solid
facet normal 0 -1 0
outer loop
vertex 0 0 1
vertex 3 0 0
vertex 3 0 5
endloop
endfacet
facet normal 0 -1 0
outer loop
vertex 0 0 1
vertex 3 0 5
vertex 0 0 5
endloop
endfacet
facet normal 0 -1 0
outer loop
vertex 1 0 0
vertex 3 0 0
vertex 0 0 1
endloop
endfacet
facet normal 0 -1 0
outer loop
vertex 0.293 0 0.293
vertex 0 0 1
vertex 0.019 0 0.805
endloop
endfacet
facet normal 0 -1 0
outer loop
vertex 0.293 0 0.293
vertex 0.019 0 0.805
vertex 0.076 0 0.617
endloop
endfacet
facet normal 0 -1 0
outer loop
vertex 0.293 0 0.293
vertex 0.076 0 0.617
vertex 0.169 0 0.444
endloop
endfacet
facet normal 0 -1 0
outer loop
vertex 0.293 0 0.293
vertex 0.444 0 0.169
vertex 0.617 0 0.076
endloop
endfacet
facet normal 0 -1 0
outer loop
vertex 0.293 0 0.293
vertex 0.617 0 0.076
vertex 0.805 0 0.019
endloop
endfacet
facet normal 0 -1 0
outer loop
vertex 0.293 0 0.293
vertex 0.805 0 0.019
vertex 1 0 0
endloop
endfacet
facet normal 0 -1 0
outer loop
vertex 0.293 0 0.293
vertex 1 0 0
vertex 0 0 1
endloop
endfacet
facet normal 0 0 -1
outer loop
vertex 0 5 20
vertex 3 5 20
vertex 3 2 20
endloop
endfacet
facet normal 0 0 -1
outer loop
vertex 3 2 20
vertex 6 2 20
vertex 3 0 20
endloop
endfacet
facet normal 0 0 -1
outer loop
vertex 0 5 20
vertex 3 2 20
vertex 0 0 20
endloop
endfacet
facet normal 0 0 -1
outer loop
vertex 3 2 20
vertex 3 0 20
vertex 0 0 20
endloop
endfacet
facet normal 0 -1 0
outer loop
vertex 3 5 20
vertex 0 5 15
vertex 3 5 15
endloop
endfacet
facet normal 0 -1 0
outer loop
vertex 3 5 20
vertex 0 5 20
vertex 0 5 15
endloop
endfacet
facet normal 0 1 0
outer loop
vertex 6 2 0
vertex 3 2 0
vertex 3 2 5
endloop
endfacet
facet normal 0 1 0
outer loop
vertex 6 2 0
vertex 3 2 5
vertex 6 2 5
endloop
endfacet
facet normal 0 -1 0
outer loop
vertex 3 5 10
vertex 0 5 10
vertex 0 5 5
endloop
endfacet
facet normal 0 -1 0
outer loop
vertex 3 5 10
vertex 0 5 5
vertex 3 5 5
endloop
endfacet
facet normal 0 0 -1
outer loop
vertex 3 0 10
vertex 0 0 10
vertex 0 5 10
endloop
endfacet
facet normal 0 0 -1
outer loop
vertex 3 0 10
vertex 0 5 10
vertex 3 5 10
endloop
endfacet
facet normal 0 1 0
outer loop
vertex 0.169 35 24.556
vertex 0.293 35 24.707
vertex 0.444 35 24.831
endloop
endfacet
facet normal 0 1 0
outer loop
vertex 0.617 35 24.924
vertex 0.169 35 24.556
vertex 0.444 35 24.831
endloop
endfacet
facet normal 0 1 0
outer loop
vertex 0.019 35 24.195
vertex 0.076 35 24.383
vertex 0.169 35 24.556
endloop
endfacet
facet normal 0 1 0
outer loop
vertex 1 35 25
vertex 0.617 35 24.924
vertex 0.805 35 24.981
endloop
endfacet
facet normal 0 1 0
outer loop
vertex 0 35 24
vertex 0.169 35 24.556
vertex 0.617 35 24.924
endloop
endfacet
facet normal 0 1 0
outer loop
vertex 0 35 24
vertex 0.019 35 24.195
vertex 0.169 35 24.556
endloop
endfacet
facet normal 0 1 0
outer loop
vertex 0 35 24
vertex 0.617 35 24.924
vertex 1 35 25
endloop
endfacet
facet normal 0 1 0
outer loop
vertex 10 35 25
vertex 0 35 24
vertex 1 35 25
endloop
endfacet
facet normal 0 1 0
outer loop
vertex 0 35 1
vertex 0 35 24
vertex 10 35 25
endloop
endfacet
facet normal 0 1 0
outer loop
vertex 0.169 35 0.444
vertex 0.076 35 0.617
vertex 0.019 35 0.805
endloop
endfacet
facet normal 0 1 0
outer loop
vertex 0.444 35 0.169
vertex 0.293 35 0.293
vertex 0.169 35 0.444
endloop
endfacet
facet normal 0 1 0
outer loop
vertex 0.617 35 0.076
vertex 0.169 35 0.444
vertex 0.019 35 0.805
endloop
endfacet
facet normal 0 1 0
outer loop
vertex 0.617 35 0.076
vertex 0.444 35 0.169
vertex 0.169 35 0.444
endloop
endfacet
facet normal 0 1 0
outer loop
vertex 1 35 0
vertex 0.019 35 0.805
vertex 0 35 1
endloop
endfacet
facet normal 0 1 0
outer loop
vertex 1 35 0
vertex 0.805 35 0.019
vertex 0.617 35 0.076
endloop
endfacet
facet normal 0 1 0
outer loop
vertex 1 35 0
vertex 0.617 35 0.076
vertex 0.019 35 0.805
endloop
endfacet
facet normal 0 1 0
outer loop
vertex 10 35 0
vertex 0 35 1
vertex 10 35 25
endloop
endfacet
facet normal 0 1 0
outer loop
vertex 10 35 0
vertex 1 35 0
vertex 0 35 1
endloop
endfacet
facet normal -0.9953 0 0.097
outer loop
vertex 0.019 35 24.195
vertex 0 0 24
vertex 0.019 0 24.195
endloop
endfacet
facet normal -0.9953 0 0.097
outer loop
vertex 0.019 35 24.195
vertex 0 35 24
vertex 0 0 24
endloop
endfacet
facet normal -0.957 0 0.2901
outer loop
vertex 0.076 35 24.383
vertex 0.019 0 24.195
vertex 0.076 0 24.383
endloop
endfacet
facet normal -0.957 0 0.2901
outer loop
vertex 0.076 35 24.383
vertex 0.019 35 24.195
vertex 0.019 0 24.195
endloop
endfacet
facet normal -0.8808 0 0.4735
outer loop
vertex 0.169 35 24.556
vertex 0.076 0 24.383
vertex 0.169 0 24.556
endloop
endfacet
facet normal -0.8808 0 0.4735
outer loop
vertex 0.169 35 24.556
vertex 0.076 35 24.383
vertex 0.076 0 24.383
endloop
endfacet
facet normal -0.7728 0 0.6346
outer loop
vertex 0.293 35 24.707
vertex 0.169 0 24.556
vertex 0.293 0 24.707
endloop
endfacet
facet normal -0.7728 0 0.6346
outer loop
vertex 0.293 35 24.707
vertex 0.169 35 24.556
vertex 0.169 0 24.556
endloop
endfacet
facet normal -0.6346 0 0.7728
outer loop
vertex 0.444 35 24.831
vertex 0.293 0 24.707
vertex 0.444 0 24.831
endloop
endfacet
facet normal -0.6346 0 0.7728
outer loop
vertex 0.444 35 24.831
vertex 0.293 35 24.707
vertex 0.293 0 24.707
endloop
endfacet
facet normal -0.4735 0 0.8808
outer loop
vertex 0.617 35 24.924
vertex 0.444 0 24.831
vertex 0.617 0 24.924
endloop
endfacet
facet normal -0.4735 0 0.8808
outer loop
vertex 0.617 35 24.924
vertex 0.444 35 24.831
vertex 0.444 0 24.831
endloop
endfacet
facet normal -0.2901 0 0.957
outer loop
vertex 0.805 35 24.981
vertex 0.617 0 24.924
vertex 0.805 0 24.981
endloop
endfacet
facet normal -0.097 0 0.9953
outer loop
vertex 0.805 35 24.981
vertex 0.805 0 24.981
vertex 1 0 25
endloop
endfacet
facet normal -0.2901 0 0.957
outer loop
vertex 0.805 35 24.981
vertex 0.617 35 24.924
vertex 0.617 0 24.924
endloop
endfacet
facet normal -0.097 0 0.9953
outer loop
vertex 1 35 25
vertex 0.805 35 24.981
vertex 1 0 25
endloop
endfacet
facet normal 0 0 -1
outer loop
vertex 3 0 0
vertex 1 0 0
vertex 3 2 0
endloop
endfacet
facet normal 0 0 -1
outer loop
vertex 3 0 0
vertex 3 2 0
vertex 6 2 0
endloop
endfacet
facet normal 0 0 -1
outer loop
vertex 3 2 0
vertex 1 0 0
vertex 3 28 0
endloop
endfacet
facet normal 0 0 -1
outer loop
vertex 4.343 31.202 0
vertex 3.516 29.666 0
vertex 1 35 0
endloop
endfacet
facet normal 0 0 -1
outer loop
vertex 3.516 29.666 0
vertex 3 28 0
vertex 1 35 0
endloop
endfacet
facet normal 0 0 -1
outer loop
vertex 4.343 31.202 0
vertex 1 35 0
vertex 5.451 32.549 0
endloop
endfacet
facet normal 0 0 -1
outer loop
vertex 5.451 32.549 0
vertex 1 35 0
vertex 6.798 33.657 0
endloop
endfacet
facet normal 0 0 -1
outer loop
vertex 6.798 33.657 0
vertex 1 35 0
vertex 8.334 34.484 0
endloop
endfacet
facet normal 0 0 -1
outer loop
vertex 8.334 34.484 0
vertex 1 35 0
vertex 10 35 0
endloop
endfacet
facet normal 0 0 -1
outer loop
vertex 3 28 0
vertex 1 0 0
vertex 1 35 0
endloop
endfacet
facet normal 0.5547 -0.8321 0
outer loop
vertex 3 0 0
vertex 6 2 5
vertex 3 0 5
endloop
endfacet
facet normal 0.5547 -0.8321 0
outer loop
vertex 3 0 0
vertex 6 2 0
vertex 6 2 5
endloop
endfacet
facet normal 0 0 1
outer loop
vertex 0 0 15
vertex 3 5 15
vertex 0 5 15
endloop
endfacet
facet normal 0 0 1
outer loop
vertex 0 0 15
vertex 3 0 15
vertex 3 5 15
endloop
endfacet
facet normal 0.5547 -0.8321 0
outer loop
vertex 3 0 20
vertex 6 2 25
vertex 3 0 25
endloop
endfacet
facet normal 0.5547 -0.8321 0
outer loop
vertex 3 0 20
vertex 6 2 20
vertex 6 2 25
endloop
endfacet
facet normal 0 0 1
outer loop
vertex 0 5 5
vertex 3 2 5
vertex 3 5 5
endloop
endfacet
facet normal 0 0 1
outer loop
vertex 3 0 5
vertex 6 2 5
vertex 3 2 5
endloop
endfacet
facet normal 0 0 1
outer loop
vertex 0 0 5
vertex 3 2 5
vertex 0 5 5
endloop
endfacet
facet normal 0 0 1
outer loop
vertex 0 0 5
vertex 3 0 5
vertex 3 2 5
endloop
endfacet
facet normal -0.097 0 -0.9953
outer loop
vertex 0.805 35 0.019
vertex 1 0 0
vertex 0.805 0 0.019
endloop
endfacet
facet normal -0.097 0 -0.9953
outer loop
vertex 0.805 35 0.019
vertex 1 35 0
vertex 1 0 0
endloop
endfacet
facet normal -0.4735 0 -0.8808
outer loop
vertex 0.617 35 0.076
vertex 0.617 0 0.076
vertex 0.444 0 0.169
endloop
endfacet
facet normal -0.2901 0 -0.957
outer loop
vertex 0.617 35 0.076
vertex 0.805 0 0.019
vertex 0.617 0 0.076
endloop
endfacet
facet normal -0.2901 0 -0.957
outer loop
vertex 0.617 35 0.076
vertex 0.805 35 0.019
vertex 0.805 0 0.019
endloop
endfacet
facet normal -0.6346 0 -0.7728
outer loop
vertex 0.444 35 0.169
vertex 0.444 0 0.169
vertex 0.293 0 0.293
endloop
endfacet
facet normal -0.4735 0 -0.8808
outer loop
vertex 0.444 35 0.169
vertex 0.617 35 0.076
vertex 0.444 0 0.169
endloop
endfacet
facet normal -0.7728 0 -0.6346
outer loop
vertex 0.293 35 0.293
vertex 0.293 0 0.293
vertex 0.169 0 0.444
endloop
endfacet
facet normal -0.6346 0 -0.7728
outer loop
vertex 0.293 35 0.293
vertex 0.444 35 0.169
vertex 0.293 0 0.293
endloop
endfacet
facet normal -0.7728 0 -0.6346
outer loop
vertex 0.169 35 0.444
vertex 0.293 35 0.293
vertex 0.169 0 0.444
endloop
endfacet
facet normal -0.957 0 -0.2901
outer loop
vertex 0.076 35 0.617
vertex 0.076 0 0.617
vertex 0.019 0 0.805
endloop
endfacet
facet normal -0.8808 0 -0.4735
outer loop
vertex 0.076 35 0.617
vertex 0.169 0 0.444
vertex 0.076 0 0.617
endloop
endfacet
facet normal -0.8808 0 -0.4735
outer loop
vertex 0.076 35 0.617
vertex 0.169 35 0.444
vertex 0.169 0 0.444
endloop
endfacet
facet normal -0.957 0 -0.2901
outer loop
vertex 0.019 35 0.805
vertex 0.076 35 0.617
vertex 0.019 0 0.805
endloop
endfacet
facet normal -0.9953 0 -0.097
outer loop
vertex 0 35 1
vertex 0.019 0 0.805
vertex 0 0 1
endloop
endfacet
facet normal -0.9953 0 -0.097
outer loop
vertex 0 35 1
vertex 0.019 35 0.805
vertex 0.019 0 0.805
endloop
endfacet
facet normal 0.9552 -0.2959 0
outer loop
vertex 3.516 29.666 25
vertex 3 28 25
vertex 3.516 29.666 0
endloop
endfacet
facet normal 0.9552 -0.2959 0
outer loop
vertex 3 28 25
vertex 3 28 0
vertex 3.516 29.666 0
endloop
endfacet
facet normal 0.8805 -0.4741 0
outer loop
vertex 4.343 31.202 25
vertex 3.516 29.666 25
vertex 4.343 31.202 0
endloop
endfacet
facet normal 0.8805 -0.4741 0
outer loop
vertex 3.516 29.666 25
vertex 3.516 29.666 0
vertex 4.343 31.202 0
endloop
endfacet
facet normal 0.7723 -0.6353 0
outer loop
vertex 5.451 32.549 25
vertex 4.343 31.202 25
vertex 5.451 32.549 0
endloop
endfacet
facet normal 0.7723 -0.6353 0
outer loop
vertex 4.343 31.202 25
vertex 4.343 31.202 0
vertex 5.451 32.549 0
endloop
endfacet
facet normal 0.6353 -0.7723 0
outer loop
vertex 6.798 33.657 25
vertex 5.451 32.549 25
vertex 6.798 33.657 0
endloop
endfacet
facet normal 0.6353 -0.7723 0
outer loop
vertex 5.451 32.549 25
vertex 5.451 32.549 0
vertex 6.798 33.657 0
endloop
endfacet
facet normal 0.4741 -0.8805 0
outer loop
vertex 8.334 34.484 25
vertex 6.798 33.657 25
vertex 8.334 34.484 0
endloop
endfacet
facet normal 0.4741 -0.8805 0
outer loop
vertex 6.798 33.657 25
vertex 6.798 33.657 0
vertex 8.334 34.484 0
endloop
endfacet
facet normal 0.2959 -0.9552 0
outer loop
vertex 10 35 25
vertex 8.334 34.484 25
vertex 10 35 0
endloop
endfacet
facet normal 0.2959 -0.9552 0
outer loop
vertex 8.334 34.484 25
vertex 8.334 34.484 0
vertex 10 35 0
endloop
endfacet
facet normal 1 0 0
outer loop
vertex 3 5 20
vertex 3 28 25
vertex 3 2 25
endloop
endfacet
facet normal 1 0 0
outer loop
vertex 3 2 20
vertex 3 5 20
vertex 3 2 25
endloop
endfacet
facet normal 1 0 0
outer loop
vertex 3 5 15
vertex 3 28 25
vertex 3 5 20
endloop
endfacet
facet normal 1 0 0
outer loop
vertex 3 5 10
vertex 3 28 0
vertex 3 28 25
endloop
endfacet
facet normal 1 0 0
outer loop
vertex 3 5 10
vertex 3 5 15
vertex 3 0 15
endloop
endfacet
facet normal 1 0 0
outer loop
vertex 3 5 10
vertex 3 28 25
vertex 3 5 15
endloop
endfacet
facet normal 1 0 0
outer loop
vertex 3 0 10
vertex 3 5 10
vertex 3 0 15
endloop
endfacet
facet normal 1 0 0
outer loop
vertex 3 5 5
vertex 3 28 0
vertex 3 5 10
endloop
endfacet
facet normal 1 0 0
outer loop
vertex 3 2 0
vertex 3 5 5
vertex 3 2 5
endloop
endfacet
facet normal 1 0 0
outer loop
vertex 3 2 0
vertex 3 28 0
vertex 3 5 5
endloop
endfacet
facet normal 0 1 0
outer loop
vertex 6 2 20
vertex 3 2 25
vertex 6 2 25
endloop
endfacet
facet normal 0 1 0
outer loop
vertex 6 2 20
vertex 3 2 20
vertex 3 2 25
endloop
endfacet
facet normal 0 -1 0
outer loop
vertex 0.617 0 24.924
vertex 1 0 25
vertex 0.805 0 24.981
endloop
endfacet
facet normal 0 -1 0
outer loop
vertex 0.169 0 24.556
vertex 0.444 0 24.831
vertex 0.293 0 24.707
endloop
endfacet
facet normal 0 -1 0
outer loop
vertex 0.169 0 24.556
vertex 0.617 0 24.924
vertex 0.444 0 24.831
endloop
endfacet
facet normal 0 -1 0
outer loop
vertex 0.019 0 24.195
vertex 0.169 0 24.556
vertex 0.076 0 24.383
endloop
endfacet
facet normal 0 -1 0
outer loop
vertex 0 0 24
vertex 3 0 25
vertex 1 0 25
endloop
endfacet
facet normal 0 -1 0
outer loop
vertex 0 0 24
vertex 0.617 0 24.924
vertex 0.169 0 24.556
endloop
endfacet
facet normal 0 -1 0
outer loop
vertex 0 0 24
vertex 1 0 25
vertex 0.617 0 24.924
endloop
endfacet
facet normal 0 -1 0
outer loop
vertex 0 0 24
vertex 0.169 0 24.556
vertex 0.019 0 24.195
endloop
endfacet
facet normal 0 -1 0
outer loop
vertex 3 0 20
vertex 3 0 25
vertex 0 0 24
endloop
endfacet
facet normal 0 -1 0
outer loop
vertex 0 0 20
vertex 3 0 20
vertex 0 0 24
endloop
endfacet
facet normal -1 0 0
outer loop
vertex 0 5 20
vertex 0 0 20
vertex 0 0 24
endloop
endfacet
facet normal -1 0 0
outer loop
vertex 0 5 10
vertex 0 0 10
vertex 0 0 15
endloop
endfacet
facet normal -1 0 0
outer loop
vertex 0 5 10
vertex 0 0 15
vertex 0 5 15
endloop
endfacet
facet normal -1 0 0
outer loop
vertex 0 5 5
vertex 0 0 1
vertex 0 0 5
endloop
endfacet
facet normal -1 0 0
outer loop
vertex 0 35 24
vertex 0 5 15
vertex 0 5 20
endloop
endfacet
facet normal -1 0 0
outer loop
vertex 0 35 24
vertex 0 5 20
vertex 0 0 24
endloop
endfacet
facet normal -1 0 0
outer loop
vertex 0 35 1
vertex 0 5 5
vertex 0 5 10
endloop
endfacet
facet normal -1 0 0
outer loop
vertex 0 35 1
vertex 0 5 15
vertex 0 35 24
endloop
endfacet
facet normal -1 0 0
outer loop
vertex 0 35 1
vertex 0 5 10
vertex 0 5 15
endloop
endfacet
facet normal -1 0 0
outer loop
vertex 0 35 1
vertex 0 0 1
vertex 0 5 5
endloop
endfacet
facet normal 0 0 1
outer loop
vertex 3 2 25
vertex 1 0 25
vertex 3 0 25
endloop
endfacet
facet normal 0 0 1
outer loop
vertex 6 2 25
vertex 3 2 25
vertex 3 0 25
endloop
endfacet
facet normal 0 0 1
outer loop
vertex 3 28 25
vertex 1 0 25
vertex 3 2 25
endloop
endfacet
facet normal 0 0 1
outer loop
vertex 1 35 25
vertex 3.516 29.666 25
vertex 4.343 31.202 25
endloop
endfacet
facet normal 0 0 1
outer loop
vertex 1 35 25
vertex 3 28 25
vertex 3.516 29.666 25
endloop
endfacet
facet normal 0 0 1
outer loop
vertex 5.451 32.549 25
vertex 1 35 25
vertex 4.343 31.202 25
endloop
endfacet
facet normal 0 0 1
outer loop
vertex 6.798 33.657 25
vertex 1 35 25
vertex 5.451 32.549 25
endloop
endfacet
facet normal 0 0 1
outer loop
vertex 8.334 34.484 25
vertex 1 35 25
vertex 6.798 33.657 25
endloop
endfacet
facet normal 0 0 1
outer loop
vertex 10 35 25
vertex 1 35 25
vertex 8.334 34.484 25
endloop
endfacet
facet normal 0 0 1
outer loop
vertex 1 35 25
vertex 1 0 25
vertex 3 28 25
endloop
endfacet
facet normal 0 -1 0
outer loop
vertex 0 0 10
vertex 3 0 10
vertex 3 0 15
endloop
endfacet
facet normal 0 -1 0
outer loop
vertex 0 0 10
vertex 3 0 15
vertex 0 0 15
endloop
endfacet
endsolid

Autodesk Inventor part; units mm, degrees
ref_plane "YZ Plane" through (0, 0, 0) normal (1, 0, 0) x (0, 1, 0)
ref_plane "XZ Plane" through (0, 0, 0) normal (0, 1, 0) x (-1, 0, 0)
ref_plane "XY Plane" through (0, 0, 0) normal (0, 0, 1) x (1, 0, 0)
sketch "Sketch1" plane through (0, 0, 0) normal (0, 0, 1) x (1, 0, 0)
  line L0 (0, 0) -> (0, 35)
  line L1 (0, 35) -> (3, 35)
  line L2 (3, 28) -> (3, 2)
  line L3 (3, 0) -> (0, 0)
  line L4 (3, 2) -> (6, 2)
  line L5 (6, 2) -> (3, 0)
  line L6 (10, 35) -> (3, 35)
  arc A0 (10, 35) -> (3, 28) centre (11.8151, 26.1849) ccw
  dimension "d7" = 9
  dimension "d8" = 3
  dimension "d9" = 7
  dimension "d10" = 7
extrude "Extrusion1" add sketch "Sketch1" along normal blind 25
fillet "Fillet1" radius 1 1 edges at (0, 17.5, 25)
fillet "Fillet2" radius 1 1 edges at (0, 17.5, 0)
sketch "Sketch2" plane through (3, 0, 0) normal (0, -1, 0) x (1, 0, 0)
  line L0 (-3, 1) -> (-3, 24) projected
  line L1 (0, 5) -> (-3, 5)
  line L2 (-3, 5) -> (-3, 10)
  line L3 (-3, 10) -> (0, 10)
  line L4 (0, 15) -> (-3, 15)
  line L5 (0, 20) -> (-3, 20)
  line L6 (-3, 15) -> (-3, 20)
  line L7 (3.0852, 20) -> (0, 20)
  line L8 (3.0852, 20) -> (3.0852, 15)
  line L9 (3.0852, 15) -> (-1, 15)
  line L10 (0, 10) -> (1.0426, 10)
  line L11 (1.0426, 10) -> (3.0852, 10)
  line L12 (3.0852, 10) -> (3.0852, 5)
  line L13 (3.0852, 5) -> (0, 5)
  point P0 (-3, 0)
  dimension "d17" = 5
extrude "Extrusion2" cut sketch "Sketch2" against normal blind 5
sketch "Sketch3" plane through (3, 2, 10) normal (0, 1, 0) x (1, 0, 0)
  line L0 (3, 0) -> (0, 0) projected
  line L1 (0, -5) -> (3, -5) projected
  line L2 (3, 0) -> (3, -5) projected
  line L3 (0, -5) -> (0, 0)
  line L4 (3, 0) -> (0, 0)
  line L5 (3, 0) -> (3, -5)
  line L6 (3, -5) -> (0, -5)
  point P0 (-3, 10)
extrude "Extrusion3" cut sketch "Sketch3" against normal blind 5
properties part number "parteA"
